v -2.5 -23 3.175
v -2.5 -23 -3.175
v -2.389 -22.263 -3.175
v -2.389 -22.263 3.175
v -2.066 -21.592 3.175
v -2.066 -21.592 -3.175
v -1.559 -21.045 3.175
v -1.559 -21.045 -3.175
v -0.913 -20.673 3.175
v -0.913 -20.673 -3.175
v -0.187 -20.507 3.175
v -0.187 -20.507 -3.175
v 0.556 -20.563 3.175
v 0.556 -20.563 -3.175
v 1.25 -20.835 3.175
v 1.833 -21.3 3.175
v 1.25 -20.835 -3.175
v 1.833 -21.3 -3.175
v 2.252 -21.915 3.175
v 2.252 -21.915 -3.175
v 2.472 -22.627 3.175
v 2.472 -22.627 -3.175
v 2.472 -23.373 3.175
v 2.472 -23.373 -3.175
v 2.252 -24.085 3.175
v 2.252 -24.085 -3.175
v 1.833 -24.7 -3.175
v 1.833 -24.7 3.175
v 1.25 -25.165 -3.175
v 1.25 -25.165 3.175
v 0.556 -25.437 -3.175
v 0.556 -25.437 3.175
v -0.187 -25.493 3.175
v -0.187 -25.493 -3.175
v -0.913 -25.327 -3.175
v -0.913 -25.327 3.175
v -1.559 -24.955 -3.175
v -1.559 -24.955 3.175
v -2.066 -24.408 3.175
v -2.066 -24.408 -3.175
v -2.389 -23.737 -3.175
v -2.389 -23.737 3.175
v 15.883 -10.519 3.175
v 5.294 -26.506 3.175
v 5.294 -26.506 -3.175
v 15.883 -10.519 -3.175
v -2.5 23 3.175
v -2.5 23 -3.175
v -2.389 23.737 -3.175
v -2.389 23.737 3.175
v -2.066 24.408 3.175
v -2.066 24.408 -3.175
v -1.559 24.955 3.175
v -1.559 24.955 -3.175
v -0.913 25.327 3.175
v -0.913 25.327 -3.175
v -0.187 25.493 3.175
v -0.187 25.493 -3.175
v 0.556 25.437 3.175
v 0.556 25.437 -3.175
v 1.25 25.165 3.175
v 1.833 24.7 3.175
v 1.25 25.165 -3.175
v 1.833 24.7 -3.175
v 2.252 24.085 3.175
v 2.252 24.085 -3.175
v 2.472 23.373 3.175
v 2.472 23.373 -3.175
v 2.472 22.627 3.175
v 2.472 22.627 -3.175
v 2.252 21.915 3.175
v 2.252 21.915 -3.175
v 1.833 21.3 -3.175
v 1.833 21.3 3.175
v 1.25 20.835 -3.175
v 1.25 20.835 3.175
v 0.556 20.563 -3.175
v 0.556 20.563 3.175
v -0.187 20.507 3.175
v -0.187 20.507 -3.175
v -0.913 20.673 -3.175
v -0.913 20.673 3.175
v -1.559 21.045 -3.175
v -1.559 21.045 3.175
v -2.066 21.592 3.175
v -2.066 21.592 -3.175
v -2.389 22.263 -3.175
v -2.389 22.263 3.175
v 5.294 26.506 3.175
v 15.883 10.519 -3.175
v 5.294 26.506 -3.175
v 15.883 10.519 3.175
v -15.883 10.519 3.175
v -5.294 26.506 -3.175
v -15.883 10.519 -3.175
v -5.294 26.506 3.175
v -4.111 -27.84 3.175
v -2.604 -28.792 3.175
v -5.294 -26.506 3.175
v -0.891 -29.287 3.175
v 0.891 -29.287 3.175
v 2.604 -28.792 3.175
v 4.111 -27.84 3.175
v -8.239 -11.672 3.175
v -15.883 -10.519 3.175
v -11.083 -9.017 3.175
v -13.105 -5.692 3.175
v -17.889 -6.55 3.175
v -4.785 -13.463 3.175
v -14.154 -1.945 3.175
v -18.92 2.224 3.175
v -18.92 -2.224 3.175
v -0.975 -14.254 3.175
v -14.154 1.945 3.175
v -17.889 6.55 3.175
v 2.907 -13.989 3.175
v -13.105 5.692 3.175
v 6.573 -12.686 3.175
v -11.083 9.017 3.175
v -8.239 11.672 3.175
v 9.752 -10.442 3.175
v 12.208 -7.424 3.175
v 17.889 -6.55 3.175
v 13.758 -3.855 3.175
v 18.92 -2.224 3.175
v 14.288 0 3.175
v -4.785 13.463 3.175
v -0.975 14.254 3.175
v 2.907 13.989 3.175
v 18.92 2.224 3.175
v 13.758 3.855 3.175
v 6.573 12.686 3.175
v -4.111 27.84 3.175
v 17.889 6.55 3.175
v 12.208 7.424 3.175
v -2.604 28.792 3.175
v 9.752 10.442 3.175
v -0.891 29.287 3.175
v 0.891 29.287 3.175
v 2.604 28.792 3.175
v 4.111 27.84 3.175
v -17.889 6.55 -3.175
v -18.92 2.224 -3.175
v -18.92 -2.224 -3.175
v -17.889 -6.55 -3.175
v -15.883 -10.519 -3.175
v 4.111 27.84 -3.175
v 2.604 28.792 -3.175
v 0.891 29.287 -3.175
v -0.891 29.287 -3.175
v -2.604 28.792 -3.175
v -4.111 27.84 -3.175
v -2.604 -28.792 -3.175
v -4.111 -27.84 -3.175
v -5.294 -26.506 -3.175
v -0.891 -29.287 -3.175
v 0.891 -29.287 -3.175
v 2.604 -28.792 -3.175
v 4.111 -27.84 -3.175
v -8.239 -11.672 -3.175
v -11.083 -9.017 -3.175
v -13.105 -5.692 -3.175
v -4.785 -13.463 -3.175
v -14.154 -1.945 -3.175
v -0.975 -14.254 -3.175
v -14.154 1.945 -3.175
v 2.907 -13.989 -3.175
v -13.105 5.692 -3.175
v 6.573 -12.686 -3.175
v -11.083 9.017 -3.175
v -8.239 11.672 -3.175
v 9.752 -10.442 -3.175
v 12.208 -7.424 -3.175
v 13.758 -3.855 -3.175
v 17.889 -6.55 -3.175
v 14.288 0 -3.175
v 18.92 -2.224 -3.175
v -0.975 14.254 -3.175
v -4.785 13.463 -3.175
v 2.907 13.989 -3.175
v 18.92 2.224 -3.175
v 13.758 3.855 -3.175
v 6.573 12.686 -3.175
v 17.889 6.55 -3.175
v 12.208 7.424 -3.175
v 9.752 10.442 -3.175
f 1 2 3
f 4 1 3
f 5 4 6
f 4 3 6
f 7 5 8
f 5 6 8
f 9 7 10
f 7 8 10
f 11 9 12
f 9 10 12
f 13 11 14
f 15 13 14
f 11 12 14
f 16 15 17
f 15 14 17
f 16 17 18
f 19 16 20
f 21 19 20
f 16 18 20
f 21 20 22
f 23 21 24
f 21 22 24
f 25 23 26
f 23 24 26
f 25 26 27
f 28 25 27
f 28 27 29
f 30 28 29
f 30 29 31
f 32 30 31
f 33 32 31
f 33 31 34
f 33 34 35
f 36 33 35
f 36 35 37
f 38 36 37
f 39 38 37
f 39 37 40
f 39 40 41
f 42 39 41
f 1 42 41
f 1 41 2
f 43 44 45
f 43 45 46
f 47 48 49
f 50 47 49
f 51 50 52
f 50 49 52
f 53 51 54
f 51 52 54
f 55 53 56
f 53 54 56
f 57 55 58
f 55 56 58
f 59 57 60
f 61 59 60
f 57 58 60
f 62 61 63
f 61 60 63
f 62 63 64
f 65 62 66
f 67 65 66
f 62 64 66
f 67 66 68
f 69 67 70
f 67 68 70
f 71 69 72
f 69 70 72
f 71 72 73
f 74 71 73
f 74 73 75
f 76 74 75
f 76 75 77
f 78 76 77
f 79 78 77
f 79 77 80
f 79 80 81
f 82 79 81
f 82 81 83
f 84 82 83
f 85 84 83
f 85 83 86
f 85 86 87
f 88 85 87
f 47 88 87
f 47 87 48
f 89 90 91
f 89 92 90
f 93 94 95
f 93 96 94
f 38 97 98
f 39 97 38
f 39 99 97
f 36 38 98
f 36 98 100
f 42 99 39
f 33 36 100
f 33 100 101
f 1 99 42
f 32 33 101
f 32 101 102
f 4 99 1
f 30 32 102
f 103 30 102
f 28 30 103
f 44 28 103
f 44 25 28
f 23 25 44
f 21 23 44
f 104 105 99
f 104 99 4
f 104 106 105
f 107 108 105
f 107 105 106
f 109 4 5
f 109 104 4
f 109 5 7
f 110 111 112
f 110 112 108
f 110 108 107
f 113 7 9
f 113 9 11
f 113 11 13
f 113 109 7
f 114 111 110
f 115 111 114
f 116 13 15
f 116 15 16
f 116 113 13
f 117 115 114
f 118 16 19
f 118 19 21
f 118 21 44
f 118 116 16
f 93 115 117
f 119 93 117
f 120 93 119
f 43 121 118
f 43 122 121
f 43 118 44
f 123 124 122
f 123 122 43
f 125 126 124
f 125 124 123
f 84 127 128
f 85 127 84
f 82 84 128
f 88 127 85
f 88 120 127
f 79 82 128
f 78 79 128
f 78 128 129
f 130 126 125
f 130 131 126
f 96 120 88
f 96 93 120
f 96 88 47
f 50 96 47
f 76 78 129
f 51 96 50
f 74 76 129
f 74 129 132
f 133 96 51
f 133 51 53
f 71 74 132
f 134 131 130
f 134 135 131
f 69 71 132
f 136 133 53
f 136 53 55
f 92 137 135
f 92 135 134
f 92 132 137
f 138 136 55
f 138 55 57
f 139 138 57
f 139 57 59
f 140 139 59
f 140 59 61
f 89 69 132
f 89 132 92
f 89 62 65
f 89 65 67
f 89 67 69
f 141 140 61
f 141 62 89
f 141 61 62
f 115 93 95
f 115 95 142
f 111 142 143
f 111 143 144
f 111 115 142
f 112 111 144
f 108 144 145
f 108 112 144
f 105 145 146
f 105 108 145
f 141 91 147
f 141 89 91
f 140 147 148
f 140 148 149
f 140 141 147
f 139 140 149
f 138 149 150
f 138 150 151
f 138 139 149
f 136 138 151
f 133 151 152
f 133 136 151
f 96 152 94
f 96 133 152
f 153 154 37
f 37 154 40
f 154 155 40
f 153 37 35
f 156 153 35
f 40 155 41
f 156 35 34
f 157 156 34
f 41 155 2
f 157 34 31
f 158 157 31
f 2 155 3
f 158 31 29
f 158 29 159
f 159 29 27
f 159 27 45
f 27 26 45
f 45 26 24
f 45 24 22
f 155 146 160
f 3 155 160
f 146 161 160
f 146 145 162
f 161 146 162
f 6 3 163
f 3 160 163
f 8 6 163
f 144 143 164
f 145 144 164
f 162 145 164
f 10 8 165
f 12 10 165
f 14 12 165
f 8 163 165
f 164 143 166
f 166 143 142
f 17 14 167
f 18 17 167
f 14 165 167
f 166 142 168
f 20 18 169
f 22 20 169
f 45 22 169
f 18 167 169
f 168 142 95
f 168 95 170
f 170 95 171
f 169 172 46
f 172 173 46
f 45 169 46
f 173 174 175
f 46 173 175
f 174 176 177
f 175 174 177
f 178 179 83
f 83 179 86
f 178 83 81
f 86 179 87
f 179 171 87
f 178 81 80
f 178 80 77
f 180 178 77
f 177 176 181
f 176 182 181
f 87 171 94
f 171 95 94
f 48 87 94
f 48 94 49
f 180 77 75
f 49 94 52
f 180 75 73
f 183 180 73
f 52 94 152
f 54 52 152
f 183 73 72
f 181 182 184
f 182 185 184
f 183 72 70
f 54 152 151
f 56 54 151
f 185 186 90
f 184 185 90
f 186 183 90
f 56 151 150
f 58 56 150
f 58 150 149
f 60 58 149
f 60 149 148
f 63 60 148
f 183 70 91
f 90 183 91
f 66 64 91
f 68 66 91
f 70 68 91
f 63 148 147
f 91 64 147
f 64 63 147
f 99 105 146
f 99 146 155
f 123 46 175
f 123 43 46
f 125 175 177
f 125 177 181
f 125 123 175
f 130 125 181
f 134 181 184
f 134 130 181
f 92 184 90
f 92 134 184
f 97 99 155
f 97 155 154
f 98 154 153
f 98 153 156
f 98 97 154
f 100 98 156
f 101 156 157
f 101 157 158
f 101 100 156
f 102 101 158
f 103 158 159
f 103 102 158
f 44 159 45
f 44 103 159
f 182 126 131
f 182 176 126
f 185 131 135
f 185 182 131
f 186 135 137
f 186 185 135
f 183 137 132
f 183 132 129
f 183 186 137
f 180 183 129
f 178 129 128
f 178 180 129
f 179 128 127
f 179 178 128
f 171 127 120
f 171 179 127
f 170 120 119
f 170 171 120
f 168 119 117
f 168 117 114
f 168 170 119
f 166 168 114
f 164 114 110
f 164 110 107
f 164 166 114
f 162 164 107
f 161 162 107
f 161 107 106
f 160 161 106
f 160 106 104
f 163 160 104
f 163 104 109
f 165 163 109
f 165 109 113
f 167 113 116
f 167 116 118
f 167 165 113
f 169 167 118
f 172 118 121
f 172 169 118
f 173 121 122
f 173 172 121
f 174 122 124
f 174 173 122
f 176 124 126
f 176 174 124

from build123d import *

# Parameters (mm, degrees)
SKETCH1_R             = 14.2875
BOSS_EXTRUDE1_DEPTH   = 3.175
F_5_0MM_DOWEL_HOLE1_D = 5


with BuildPart() as part:
    # Sketch1 → Boss-Extrude1 (new, symmetric)
    with BuildSketch(Plane.XY):
        with BuildLine():
            Line((-5.294178862, 26.506304348), (-15.882536585, 10.518913043))
            ThreePointArc((-15.882536585, 10.518913043), (-19.05, 0), (-15.882536585, -10.518913043))
            Line((-15.882536585, -10.518913043), (-5.294178862, -26.506304348))
            ThreePointArc((-5.294178862, -26.506304348), (0, -29.35), (5.294178862, -26.506304348))
            Line((5.294178862, -26.506304348), (15.882536585, -10.518913043))
            ThreePointArc((15.882536585, -10.518913043), (19.05, 0), (15.882536585, 10.518913043))
            Line((15.882536585, 10.518913043), (5.294178862, 26.506304348))
            ThreePointArc((5.294178862, 26.506304348), (0, 29.35), (-5.294178862, 26.506304348))
        make_face()
        Circle(SKETCH1_R, mode=Mode.SUBTRACT)
    extrude(amount=BOSS_EXTRUDE1_DEPTH, both=True)

    # Ø5.0mm Dowel Hole1 (through all)
    with Locations(Plane.XY.offset(3.175)):
        with Locations((0, 23), (0, -23)):
            Hole(F_5_0MM_DOWEL_HOLE1_D / 2)


solid = part.part
